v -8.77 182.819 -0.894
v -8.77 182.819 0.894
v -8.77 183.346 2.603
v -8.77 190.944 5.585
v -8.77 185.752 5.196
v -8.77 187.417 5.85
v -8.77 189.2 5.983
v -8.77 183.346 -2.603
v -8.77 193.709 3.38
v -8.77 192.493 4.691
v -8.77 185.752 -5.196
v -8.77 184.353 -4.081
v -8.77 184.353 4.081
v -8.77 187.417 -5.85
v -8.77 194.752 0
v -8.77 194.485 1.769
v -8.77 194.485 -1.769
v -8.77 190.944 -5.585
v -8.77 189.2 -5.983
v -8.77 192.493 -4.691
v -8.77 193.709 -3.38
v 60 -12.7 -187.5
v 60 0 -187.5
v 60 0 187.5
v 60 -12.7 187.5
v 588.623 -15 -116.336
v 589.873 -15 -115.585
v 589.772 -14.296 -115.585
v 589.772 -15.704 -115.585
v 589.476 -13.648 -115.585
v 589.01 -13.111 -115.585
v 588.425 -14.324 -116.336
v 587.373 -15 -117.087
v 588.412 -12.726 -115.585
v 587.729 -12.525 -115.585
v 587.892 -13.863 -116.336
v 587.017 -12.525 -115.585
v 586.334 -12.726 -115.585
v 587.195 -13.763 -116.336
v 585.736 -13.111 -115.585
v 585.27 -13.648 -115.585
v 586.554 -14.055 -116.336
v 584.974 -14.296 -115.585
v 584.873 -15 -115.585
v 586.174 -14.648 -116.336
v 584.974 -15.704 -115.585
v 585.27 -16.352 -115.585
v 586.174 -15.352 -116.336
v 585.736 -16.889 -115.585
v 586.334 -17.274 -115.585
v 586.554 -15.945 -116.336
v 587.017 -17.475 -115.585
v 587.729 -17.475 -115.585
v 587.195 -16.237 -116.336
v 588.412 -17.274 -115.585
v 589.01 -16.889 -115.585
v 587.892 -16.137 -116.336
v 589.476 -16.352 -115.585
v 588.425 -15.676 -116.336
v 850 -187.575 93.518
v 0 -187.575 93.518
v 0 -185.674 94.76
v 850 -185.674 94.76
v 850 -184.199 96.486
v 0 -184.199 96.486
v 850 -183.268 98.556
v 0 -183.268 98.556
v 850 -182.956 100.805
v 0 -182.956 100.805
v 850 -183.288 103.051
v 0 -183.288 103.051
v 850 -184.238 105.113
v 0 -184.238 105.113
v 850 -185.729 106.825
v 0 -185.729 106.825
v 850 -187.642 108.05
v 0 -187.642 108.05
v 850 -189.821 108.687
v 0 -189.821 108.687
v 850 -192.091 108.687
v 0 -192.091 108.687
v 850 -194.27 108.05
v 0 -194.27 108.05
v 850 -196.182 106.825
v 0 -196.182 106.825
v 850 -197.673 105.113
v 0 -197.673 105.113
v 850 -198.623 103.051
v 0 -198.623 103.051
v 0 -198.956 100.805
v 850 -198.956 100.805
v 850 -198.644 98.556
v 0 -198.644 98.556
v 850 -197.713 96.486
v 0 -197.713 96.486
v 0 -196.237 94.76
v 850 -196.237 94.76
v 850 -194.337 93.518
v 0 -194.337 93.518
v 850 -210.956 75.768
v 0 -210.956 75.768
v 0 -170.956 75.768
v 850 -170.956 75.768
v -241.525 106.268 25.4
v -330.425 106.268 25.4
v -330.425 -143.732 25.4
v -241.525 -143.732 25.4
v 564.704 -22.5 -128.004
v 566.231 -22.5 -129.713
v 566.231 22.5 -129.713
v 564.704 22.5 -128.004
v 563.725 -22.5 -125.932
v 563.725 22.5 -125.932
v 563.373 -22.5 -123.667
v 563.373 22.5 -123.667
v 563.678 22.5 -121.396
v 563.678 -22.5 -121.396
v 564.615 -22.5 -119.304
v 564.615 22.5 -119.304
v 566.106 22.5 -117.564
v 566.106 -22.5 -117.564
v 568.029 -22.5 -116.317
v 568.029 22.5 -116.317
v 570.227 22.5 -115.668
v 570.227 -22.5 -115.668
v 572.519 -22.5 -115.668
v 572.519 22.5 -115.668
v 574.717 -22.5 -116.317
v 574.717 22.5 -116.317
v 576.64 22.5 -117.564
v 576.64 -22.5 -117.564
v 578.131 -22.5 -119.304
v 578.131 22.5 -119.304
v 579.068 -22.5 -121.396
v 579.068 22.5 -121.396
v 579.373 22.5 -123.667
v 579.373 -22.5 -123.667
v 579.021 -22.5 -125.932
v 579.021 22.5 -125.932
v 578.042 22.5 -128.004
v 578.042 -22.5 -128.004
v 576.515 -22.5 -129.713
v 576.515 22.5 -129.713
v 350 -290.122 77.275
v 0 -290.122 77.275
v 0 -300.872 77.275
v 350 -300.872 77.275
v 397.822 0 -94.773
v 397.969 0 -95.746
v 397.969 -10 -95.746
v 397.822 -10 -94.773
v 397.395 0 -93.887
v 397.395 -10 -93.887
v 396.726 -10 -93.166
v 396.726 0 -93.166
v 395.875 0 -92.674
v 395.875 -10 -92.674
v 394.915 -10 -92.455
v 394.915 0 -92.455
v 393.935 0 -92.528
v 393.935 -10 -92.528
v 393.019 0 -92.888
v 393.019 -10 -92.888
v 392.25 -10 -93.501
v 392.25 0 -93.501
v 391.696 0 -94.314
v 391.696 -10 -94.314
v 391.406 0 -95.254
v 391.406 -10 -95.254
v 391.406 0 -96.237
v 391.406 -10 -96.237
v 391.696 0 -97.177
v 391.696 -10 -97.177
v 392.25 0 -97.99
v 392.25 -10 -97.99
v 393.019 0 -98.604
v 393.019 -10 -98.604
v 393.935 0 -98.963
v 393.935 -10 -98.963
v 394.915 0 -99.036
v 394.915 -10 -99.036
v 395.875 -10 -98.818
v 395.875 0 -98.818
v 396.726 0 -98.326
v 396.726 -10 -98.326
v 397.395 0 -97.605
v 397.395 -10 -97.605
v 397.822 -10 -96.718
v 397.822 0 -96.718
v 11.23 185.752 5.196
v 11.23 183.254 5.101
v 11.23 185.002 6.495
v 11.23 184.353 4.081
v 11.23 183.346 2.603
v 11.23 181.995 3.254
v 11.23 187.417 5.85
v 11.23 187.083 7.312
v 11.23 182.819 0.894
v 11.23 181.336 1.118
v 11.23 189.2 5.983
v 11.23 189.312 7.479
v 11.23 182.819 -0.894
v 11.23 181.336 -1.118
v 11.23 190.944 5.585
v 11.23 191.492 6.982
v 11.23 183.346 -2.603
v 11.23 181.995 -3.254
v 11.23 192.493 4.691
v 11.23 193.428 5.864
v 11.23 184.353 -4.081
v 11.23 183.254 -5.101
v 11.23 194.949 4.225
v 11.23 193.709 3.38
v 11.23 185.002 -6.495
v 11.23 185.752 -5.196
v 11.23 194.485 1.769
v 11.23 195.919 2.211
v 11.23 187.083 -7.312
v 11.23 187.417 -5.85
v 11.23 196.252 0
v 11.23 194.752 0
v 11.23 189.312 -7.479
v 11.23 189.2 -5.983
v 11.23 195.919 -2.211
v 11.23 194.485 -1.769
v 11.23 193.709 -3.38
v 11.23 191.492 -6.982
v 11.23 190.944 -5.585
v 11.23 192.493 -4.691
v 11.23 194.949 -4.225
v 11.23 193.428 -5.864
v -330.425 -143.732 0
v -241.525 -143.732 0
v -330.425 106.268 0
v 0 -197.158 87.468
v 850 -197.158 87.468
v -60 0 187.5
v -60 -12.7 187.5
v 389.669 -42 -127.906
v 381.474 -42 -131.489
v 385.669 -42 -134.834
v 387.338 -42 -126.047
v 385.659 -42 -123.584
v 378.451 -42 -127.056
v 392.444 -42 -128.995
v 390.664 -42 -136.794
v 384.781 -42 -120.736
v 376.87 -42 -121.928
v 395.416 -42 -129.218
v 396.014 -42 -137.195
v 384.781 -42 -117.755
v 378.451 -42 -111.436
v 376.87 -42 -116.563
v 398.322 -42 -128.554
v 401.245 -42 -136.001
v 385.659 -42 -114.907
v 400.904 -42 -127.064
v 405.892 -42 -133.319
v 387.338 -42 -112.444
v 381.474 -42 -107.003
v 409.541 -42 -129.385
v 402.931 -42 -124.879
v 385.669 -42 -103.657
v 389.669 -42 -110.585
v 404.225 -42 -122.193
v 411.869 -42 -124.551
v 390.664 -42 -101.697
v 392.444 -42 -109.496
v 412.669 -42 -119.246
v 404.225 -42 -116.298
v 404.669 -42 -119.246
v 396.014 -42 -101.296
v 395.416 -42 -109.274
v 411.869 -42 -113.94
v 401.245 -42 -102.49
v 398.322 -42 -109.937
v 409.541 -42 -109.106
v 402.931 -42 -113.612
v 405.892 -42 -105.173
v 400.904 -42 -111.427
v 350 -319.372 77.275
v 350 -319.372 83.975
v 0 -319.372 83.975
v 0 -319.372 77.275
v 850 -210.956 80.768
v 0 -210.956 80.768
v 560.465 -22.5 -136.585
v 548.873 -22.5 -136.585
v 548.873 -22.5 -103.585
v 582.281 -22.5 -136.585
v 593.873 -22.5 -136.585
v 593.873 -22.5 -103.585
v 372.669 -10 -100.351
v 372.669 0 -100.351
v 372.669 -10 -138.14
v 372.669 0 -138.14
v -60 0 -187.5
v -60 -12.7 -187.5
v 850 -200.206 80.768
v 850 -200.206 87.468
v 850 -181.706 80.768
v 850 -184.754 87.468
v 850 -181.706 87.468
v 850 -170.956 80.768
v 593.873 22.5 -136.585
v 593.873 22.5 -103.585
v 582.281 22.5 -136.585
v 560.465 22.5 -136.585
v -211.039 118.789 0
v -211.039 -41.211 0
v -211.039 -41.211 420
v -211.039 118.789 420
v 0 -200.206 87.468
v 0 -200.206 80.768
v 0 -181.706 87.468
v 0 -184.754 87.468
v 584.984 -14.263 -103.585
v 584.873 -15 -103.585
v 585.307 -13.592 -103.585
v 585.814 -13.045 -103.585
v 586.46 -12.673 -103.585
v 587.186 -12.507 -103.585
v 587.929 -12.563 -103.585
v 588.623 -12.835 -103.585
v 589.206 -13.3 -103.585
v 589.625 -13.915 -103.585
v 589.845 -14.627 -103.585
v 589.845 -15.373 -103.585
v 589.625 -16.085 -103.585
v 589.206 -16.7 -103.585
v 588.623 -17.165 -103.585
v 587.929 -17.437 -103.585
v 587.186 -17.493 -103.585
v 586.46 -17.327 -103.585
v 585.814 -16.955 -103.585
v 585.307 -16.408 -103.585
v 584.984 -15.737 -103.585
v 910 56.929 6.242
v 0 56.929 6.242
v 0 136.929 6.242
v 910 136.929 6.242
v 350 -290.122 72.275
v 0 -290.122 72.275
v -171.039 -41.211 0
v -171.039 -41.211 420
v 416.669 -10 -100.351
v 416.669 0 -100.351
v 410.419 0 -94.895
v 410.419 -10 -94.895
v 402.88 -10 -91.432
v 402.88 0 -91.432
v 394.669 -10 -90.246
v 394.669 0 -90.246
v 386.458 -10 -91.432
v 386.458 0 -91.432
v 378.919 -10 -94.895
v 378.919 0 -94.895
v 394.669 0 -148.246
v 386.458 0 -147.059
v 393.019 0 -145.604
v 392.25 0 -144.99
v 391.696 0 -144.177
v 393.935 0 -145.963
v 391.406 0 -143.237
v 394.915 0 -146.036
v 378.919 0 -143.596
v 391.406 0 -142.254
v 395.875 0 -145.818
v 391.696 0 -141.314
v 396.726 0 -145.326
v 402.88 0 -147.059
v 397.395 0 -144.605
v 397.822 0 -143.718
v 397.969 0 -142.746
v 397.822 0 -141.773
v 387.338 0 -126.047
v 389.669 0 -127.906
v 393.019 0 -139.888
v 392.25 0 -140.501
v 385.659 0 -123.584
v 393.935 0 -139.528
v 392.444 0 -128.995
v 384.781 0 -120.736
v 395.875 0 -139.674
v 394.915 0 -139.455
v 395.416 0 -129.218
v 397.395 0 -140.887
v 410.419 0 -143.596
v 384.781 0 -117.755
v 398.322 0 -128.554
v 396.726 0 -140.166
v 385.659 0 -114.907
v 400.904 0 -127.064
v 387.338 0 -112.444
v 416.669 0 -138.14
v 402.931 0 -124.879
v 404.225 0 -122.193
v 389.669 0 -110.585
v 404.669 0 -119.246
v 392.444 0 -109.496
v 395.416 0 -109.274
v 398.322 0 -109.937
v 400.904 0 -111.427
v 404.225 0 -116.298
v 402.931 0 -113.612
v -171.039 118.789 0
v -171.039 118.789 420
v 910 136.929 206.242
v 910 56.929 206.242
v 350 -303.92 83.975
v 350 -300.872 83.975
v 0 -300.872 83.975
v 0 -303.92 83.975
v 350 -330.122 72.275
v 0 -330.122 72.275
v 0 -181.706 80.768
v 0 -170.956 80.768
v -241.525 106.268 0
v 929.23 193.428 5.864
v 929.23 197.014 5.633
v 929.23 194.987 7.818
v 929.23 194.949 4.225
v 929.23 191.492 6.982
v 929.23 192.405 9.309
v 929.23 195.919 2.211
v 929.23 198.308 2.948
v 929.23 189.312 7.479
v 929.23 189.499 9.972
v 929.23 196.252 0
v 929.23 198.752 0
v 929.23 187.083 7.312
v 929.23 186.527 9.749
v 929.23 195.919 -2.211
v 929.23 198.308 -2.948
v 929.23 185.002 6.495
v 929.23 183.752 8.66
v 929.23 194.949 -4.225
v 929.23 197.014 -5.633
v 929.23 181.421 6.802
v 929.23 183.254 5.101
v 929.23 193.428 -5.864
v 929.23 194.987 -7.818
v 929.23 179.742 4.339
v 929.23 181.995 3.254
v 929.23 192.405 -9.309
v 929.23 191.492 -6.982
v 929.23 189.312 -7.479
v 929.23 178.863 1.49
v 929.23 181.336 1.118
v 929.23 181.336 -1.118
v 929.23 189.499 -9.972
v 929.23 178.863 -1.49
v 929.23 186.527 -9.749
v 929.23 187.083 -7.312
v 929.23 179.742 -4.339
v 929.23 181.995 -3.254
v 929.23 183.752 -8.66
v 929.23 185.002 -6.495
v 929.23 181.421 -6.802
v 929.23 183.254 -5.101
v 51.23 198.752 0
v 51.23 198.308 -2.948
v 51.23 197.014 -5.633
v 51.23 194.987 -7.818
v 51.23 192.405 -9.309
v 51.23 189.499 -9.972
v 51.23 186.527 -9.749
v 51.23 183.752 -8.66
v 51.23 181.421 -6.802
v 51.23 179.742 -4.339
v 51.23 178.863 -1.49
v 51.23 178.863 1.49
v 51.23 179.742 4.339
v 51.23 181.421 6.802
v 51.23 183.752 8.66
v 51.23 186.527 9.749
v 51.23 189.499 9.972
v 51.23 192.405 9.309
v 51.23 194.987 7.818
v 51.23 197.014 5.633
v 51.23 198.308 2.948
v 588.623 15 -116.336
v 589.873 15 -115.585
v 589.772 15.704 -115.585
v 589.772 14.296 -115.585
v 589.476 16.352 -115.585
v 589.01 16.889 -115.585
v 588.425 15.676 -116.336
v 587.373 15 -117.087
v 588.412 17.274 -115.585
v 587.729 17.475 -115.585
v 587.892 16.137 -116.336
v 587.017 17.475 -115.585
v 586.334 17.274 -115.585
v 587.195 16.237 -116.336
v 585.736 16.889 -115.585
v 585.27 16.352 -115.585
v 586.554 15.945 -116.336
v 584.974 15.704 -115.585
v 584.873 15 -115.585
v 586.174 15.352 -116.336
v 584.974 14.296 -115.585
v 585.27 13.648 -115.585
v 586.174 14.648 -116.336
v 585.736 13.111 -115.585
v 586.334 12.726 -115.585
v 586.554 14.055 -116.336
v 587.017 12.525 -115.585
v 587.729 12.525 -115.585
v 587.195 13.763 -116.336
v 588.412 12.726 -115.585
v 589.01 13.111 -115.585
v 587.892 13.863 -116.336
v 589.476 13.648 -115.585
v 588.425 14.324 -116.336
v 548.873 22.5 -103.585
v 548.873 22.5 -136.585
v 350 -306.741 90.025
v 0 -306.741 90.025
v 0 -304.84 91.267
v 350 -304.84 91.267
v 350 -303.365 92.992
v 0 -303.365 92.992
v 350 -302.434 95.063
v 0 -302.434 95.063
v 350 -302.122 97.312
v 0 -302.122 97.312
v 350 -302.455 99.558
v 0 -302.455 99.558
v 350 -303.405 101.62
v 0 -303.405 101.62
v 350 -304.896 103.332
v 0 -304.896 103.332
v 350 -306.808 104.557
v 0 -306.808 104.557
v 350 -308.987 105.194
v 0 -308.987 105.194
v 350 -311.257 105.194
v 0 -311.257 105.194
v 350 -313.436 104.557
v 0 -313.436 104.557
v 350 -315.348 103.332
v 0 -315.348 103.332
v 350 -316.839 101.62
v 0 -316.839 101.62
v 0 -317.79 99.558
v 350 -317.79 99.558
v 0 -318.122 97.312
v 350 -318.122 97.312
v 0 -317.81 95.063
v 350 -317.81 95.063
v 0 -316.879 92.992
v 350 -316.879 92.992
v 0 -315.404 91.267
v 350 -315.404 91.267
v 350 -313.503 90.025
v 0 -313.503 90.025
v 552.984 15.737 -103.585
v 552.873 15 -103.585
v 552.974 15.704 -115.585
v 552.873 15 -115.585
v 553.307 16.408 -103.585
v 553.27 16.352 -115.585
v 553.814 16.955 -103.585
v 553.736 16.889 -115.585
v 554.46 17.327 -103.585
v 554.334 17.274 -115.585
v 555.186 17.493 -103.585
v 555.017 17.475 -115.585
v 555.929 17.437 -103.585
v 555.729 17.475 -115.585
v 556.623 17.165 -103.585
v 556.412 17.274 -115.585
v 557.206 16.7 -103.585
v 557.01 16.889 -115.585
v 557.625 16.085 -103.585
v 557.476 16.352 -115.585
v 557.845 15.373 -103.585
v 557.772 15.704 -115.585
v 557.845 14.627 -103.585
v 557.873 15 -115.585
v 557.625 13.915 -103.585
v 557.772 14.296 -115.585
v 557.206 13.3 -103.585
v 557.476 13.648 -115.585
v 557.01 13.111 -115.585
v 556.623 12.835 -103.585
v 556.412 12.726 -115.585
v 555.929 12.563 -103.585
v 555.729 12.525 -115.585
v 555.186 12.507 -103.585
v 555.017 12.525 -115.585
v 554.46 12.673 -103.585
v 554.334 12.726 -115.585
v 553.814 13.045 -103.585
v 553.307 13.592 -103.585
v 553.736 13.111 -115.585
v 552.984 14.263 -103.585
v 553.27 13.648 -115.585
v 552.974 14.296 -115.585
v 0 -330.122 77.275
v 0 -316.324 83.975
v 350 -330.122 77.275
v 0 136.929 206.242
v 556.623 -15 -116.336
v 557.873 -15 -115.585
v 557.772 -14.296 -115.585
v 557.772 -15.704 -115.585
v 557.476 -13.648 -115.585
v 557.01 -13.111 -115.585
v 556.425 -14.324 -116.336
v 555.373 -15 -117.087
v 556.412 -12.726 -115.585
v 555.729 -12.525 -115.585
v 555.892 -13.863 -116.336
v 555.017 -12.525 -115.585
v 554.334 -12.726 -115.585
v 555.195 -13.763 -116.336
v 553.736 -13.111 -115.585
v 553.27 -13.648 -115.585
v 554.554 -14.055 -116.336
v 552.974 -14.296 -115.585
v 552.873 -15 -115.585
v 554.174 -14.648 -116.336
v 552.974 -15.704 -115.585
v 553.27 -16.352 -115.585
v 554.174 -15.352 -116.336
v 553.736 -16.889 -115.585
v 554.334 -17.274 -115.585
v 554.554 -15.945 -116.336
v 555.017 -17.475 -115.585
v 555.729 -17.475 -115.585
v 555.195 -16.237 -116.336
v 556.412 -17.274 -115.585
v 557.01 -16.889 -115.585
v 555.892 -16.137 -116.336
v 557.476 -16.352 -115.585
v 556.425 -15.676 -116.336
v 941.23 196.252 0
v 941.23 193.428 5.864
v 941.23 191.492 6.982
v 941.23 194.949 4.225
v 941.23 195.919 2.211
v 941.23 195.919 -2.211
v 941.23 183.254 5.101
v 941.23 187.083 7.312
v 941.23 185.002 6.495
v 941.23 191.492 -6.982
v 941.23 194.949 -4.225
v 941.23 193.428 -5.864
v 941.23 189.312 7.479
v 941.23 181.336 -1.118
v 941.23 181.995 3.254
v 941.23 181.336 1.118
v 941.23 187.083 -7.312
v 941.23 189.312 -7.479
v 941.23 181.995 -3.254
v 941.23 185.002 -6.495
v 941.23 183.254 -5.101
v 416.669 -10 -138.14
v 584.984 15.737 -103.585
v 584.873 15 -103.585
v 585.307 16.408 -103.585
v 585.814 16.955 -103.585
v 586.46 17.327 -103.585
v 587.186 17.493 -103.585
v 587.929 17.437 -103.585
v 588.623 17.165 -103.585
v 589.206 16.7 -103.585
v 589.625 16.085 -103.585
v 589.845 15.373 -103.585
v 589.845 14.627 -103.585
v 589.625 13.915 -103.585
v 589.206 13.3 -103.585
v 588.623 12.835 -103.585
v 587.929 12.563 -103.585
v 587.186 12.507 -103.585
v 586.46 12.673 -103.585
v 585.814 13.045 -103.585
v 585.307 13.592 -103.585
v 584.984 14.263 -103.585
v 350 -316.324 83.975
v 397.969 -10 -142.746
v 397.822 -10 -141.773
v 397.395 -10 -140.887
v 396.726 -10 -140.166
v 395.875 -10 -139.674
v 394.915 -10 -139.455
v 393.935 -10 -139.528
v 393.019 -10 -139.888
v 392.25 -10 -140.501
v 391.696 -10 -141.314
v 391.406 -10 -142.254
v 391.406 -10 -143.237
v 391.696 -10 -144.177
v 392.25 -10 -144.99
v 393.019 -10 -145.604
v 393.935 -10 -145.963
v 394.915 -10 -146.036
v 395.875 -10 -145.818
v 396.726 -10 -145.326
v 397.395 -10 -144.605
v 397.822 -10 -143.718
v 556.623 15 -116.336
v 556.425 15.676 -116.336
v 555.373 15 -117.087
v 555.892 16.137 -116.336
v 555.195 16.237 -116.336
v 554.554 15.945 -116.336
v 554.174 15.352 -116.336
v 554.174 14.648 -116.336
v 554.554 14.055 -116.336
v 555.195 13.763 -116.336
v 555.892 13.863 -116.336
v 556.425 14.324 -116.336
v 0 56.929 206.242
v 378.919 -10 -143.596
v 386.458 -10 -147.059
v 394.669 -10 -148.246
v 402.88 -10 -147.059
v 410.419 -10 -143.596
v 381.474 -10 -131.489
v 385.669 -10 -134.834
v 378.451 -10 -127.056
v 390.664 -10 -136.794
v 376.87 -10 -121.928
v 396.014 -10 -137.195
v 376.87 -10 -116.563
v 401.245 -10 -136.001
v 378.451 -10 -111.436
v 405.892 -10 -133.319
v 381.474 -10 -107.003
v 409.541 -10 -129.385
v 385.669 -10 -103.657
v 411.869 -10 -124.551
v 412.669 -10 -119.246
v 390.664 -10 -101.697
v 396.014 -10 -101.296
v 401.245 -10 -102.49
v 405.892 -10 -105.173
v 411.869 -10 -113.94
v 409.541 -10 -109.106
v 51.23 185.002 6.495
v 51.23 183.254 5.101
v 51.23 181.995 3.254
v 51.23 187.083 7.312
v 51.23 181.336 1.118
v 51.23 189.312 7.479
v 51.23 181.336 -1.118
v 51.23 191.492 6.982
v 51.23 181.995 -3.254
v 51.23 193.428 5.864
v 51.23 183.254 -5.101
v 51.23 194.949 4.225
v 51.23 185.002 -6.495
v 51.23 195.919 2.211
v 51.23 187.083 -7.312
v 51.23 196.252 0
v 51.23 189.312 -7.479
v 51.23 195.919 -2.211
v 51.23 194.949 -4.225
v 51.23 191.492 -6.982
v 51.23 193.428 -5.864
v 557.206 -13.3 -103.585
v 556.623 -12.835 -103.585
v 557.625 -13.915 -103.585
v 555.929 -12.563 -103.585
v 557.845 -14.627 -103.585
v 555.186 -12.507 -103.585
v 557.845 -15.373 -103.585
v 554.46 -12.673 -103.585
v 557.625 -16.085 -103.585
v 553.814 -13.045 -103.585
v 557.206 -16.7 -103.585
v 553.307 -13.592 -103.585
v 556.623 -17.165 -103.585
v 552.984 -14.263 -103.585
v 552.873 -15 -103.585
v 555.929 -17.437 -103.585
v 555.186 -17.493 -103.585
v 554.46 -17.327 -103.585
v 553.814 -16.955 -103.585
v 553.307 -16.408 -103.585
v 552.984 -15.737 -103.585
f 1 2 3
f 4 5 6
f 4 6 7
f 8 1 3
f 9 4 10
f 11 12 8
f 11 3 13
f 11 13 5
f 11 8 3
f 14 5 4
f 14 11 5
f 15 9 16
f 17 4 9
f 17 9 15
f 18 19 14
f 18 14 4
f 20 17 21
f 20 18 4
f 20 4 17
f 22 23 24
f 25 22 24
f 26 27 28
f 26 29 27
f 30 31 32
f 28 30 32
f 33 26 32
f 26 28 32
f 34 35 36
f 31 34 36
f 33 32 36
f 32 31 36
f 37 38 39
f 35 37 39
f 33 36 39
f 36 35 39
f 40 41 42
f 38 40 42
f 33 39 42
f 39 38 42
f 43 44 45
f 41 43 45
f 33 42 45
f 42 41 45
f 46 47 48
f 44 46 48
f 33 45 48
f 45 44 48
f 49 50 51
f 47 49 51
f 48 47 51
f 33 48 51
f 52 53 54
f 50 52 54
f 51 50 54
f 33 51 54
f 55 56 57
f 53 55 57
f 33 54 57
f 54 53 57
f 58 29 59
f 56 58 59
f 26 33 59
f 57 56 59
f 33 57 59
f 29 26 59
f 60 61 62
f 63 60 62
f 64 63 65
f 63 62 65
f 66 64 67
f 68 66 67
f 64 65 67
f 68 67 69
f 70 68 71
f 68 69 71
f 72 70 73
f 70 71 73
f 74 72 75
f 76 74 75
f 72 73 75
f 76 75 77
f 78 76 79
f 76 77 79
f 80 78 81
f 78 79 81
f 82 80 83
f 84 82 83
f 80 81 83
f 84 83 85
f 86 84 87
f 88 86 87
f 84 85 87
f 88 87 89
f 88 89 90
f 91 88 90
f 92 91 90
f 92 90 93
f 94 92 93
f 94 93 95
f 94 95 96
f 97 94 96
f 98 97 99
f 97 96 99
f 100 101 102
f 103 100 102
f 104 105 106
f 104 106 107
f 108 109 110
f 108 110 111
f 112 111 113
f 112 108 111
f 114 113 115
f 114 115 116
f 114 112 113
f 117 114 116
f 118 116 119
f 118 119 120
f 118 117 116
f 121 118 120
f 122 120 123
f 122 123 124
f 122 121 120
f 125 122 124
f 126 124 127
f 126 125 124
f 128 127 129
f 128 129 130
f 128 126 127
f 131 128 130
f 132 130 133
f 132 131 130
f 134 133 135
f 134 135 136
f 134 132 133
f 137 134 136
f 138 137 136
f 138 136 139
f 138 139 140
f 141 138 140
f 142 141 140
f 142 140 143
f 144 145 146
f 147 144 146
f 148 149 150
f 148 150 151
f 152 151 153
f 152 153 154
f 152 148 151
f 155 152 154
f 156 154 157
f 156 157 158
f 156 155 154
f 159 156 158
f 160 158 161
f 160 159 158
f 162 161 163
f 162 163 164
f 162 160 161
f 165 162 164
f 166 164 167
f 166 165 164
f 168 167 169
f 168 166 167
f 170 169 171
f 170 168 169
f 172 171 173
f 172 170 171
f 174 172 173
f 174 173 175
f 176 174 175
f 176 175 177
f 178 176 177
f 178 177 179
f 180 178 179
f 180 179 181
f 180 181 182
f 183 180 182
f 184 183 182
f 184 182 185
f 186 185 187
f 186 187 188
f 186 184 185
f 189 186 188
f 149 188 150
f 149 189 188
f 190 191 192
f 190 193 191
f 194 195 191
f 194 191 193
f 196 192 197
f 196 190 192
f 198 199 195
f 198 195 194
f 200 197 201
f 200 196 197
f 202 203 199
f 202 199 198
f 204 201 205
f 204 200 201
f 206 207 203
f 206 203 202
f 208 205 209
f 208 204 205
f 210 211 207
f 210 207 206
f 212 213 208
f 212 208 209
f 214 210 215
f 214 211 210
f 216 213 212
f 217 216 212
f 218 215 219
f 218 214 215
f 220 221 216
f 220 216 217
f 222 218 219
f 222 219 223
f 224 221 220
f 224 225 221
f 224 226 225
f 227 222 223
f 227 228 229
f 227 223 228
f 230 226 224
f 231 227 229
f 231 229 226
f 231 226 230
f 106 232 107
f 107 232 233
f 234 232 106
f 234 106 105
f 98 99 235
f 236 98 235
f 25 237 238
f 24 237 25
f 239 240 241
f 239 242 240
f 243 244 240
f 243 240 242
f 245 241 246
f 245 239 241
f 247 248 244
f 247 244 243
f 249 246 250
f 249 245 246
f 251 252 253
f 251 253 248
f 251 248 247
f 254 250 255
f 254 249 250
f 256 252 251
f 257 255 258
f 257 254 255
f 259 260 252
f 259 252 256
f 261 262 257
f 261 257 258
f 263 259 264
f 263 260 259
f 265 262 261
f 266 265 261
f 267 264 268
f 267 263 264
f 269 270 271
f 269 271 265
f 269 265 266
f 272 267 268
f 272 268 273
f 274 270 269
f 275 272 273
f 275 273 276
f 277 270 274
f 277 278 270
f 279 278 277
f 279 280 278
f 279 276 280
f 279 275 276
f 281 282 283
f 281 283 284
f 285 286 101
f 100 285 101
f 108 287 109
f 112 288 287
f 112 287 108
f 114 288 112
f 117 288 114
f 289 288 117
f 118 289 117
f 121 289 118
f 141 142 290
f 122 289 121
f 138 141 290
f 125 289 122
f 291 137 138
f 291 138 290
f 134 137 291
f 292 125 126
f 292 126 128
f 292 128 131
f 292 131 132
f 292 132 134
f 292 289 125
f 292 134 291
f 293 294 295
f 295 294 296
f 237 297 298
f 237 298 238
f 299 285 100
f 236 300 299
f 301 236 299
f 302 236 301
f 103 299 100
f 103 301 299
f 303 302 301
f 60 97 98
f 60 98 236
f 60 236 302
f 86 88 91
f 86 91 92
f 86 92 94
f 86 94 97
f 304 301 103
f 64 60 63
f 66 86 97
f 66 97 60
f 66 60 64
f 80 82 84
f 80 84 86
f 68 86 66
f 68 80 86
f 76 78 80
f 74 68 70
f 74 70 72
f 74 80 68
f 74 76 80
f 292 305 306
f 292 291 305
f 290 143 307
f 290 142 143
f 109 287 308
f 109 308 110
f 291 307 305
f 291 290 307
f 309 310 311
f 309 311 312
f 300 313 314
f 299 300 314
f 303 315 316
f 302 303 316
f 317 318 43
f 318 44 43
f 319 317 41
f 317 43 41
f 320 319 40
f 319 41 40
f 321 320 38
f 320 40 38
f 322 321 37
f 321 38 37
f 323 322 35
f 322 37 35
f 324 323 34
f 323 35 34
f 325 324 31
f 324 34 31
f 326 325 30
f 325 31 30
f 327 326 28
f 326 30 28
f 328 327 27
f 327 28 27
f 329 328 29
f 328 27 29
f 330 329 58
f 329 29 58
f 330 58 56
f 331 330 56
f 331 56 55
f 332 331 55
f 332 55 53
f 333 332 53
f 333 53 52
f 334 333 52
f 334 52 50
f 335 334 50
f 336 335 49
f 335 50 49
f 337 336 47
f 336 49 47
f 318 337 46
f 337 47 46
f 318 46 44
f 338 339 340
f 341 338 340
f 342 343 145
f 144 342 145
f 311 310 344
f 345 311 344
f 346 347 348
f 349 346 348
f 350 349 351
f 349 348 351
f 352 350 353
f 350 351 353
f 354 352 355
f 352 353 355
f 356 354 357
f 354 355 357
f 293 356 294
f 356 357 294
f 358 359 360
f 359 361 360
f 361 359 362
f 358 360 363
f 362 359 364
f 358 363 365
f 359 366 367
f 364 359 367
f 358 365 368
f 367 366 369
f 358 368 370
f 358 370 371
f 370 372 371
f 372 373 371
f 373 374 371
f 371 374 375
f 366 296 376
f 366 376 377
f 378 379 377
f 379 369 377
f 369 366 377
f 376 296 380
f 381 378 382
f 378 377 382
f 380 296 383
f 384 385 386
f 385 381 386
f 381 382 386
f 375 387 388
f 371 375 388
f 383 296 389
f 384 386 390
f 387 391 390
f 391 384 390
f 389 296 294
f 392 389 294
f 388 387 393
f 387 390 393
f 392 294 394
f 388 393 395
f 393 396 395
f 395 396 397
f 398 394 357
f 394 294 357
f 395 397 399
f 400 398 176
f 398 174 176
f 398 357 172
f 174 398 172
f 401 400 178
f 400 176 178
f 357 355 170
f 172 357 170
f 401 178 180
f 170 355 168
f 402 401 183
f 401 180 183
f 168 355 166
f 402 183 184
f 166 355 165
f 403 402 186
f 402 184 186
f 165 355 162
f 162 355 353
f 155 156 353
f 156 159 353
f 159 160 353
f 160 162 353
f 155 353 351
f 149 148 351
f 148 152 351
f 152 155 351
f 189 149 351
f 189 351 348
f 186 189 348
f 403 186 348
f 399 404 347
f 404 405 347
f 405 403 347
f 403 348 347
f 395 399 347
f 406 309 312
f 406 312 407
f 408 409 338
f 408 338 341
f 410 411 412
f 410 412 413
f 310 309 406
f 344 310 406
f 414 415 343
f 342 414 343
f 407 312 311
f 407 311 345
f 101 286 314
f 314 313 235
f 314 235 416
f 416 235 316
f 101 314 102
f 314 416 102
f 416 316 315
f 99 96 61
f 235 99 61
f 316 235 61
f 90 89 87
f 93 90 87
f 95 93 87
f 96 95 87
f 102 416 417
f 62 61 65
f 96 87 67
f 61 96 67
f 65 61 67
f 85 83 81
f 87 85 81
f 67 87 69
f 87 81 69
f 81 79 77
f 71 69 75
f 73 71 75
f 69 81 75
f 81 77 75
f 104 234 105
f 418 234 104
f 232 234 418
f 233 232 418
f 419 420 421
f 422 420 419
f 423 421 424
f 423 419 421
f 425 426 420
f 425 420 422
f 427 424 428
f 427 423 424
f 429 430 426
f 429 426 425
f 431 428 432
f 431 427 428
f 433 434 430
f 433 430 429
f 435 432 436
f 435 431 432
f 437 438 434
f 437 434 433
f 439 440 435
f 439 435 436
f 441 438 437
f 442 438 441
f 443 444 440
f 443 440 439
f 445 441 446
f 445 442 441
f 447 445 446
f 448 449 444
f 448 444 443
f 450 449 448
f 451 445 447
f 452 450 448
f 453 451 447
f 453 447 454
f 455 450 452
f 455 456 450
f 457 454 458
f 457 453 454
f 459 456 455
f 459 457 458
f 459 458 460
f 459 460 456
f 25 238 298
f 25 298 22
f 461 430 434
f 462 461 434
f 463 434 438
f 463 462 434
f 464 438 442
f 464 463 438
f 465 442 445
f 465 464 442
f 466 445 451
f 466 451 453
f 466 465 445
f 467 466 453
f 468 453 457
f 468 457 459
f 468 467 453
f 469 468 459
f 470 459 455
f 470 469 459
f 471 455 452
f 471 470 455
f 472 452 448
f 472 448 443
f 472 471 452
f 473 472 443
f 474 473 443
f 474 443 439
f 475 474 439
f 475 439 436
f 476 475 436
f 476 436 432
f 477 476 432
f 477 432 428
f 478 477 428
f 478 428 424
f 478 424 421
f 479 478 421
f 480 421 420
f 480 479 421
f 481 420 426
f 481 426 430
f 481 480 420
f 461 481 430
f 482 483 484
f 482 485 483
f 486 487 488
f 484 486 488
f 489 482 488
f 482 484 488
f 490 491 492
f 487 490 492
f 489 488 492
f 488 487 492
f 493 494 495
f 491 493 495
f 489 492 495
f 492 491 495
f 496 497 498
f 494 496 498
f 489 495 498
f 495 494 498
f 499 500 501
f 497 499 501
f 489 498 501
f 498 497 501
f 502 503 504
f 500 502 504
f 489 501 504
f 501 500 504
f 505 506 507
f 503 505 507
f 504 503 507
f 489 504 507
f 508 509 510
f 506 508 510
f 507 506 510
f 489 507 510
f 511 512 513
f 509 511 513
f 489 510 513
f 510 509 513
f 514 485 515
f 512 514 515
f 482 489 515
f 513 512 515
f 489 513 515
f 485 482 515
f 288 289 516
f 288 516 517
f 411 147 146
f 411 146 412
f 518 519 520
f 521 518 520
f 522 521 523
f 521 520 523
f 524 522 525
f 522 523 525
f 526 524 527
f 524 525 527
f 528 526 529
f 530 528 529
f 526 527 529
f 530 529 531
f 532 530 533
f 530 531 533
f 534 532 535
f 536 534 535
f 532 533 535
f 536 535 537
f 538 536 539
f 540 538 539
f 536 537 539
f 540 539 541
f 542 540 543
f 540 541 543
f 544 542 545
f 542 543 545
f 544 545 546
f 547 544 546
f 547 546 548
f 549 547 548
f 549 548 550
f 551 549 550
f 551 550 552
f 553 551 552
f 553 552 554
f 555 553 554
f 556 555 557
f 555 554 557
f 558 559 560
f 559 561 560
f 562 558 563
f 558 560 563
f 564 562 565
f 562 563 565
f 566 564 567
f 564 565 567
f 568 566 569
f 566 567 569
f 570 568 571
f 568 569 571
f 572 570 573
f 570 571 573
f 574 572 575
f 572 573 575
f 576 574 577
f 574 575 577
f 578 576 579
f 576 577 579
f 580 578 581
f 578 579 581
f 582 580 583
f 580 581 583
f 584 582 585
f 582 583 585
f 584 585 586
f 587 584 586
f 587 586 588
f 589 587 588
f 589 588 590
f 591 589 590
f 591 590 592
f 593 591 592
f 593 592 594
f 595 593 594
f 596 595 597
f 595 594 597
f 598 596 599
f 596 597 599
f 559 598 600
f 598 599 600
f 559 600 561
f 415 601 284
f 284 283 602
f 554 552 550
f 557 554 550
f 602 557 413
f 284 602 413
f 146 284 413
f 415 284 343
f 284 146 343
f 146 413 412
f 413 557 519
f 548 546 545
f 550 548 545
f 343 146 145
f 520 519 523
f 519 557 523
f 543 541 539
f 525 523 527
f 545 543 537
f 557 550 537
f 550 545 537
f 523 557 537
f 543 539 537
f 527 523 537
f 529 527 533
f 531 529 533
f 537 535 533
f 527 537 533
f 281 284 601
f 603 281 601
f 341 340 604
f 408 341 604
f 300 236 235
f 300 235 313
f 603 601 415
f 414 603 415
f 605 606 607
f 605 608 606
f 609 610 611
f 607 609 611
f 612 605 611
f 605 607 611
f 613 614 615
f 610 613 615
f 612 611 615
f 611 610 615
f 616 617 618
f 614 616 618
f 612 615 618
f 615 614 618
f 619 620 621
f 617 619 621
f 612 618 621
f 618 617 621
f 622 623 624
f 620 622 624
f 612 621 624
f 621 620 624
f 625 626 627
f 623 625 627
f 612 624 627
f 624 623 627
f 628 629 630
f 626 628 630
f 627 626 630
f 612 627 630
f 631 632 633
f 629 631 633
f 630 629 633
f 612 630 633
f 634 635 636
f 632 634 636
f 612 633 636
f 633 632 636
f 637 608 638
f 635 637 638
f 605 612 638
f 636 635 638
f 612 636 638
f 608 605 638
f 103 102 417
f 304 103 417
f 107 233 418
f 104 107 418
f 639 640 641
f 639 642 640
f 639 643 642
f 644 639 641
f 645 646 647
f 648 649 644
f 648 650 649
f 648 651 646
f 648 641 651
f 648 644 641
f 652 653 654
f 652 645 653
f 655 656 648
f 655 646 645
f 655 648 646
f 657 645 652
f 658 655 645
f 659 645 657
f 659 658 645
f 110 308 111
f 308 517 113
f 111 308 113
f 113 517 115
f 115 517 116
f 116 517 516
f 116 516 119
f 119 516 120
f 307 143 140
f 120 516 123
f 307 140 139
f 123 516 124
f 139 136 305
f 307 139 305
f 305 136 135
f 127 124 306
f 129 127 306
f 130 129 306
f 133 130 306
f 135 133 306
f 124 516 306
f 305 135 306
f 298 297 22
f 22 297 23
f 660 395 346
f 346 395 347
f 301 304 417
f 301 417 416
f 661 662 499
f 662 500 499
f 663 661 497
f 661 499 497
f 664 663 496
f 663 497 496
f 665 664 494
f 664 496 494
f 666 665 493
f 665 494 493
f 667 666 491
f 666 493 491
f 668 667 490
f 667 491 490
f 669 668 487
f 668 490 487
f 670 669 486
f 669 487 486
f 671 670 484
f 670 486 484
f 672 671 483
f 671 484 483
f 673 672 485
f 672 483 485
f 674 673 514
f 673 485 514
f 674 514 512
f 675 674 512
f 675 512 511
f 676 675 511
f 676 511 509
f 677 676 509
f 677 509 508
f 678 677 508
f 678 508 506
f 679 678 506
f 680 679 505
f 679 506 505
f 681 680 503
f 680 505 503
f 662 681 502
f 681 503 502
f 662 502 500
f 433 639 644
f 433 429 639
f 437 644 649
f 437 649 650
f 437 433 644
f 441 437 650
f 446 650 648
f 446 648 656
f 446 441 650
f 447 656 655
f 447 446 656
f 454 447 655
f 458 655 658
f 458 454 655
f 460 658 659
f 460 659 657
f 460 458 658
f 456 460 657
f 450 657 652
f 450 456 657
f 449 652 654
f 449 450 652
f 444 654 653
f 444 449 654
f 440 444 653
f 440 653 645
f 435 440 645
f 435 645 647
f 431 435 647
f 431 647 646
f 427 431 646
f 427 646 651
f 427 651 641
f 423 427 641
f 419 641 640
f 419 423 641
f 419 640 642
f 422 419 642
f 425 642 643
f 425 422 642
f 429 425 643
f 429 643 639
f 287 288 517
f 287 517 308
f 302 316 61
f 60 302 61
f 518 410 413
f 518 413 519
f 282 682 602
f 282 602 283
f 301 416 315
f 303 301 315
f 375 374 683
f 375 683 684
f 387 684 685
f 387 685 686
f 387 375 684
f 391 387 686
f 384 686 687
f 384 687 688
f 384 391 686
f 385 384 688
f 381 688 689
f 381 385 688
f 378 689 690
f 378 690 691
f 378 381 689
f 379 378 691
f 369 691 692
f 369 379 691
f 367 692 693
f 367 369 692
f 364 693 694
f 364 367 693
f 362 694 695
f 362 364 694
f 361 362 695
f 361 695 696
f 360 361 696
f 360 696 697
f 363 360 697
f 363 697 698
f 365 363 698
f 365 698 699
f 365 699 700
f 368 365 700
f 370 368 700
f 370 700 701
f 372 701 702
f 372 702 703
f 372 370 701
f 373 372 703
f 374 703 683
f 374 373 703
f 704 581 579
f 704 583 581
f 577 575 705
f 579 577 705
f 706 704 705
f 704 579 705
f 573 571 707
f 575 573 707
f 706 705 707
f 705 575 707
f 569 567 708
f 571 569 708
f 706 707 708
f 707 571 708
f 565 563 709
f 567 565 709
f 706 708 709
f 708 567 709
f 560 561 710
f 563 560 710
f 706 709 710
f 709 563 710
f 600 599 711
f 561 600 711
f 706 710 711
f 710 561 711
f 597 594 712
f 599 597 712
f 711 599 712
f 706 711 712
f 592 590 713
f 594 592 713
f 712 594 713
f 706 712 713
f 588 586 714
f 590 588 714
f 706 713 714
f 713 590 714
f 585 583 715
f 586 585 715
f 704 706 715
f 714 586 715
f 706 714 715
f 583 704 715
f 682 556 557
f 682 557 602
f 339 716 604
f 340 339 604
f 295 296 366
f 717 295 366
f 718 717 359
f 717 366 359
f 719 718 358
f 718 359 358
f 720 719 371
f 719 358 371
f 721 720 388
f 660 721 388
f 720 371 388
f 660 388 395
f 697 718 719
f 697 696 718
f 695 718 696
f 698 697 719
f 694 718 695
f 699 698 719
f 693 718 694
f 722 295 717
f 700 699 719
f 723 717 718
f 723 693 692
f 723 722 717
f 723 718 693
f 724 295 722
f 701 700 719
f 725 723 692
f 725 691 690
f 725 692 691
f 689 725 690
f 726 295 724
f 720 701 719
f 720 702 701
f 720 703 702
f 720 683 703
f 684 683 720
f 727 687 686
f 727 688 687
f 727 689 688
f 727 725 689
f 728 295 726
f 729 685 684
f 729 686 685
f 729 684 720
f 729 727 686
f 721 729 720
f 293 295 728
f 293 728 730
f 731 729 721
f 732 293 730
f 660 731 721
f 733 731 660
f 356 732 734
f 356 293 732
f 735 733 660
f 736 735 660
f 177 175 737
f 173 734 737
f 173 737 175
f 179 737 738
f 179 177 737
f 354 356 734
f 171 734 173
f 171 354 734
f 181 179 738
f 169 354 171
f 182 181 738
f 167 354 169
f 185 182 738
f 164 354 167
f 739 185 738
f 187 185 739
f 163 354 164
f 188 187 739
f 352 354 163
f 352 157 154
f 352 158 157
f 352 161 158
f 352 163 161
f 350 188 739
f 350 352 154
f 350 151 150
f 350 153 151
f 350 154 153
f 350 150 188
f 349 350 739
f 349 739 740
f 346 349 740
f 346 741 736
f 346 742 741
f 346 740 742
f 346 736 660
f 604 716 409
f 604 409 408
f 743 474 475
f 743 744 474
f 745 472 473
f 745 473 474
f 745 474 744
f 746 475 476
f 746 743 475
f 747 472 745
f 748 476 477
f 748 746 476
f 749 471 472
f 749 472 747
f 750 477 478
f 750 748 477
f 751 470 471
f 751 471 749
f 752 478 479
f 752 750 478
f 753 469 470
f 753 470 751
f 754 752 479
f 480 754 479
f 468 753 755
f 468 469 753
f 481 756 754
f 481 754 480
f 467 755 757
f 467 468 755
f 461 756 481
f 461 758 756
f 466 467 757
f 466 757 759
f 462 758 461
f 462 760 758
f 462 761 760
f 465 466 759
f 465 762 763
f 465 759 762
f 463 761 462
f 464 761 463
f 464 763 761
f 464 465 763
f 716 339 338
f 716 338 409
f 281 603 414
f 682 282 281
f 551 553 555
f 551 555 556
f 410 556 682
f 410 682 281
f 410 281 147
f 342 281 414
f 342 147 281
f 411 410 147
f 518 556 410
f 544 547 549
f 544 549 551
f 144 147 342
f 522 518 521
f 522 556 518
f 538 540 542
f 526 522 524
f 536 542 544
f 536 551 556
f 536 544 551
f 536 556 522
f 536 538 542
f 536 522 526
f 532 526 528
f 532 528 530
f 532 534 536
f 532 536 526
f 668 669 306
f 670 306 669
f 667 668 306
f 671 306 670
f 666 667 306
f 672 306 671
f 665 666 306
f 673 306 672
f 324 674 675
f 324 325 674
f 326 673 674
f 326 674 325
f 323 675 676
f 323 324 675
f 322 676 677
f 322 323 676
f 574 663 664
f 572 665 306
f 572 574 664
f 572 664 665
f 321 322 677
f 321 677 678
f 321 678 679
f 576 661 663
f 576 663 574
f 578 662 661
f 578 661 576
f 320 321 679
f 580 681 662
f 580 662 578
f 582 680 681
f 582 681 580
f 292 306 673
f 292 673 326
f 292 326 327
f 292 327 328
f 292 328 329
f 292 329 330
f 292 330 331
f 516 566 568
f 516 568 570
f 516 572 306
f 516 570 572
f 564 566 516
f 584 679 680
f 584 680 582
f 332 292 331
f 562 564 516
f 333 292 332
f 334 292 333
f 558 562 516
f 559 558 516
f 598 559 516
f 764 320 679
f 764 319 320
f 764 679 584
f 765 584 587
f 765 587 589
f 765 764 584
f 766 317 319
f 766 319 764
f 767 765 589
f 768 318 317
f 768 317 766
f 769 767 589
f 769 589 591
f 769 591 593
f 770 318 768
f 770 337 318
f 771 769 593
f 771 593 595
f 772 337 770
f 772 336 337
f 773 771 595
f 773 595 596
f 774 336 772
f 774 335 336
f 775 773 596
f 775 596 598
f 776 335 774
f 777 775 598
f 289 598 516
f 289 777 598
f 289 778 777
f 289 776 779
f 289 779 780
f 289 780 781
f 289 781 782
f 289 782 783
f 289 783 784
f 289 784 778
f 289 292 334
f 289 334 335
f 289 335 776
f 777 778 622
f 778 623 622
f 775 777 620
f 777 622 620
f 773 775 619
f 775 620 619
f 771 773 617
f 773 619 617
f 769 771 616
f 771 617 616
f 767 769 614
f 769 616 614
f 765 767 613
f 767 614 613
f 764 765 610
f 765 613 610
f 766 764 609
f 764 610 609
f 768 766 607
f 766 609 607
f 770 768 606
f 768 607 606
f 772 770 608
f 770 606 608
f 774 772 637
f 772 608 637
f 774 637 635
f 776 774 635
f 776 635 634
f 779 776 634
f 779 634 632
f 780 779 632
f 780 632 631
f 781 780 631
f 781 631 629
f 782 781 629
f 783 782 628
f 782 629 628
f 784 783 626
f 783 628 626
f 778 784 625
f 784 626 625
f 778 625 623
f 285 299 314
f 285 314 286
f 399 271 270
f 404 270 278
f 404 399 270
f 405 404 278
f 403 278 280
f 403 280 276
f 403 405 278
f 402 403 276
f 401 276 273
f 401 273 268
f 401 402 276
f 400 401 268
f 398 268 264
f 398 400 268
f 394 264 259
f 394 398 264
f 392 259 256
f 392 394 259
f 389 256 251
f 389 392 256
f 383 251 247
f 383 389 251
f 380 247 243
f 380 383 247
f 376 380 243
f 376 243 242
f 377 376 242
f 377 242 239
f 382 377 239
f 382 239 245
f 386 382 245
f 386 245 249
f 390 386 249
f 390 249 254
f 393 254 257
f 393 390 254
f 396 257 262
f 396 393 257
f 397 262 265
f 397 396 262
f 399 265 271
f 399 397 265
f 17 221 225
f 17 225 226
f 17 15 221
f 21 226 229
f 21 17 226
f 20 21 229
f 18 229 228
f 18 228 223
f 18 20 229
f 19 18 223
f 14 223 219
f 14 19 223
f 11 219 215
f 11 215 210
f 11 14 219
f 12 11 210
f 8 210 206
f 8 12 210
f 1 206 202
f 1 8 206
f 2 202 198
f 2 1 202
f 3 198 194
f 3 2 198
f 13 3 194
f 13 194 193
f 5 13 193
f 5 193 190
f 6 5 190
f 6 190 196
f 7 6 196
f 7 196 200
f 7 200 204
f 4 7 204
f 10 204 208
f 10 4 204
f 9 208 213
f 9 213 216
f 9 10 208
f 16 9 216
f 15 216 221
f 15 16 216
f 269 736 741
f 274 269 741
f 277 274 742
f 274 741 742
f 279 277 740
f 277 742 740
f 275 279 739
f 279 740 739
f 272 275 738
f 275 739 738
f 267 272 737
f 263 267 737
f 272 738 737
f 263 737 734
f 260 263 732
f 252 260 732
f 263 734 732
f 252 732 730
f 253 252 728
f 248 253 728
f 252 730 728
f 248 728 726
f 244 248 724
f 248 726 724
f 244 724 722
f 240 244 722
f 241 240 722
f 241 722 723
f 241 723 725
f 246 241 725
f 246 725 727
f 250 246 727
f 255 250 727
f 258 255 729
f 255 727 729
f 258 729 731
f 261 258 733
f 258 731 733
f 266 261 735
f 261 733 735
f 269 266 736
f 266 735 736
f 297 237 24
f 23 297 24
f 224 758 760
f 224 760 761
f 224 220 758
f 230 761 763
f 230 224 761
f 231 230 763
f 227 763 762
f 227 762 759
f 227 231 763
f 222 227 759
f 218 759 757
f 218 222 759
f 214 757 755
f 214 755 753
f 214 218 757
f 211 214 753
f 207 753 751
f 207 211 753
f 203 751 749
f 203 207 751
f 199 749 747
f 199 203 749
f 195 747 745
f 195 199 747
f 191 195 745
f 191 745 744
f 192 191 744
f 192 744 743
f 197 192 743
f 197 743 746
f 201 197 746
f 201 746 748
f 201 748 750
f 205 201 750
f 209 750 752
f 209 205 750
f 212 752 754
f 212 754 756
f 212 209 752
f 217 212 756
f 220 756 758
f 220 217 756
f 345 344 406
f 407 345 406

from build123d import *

# Parameters (mm, degrees)
F0_W      = 120
F0_H      = 375
F1_DEPTH  = 12.7
F2_W      = 80
F2_H      = 200
F3_DEPTH  = 910
F4_W      = 40
F4_H      = 160
F5_DEPTH  = 420
F6_W      = 88.9
F6_H      = 250
F7_DEPTH  = 25.4
F9_DEPTH  = 22.5
F11_D     = 5
F11_DEPTH = 12
F11_TIP   = 1.5021515476
F12_R     = 3.3
F12_R_2   = 10
F13_DEPTH = 10
F14_R     = 18
F14_R_2   = 10
F15_DEPTH = 32
F19_DEPTH = 850
F21_DEPTH = 350


with BuildPart() as f1:
    # F0 (on Front) → F1 (new body)
    with BuildSketch(Plane.XZ):
        Rectangle(F0_W, F0_H)
    extrude(amount=F1_DEPTH)


with BuildPart() as f3:
    # F2 (on Right) → F3 (new body)
    with BuildSketch(Plane.YZ):
        with Locations((96.9289559871, 106.2416992025)):
            Rectangle(F2_W, F2_H)
    extrude(amount=F3_DEPTH)


with BuildPart() as f5:
    # F4 (on Top) → F5 (new body)
    with BuildSketch(Plane.XY):
        with Locations((-191.0385191441, 38.7887568785)):
            Rectangle(F4_W, F4_H)
    extrude(amount=F5_DEPTH)


with BuildPart() as f7:
    # F6 (on Top) → F7 (new body)
    with BuildSketch(Plane.XY):
        with Locations((-285.9749857664, -18.732093201)):
            Rectangle(F6_W, F6_H)
    extrude(amount=F7_DEPTH)


with BuildPart() as f9:
    # F8 (on Front) → F9 (new body, symmetric)
    with BuildSketch(Plane.XZ):
        with BuildLine():
            Line((593.8730051517, -136.5850613447), (593.8730051517, -103.5850613447))
            Line((593.8730051517, -103.5850613447), (548.8730051517, -103.5850613447))
            Line((548.8730051517, -103.5850613447), (548.8730051517, -136.5850613447))
            Line((548.8730051517, -136.5850613447), (560.4647099464, -136.5850613447))
            Line((560.4647099464, -136.5850613447), (566.2307042743, -129.7134168896))
            ThreePointArc((566.2307042743, -129.7134168896), (571.3730051517, -115.5850613447), (576.5153060292, -129.7134168896))
            Line((576.5153060292, -129.7134168896), (582.2813003571, -136.5850613447))
            Line((582.2813003571, -136.5850613447), (593.8730051517, -136.5850613447))
        make_face()
    extrude(amount=F9_DEPTH, both=True)

    # F11
    with Locations(Plane.XY.offset(-103.5850613447)):
        with Locations((555.3730051517, 15), (587.3730051517, 15), (587.3730051517, -15), (555.3730051517, -15)):
            Hole(F11_D / 2, depth=F11_DEPTH)
            with Locations((0, 0, -(F11_DEPTH + F11_TIP / 2))):  # 118° drill point
                Cone(0, F11_D / 2, F11_TIP, mode=Mode.SUBTRACT)


with BuildPart() as f13:
    # F12 (on Front) → F13 (new body)
    with BuildSketch(Plane.XZ):
        with BuildLine():
            Line((416.6688771248, -138.14006966), (416.6688771248, -100.3511824047))
            ThreePointArc((416.6688771248, -100.3511824047), (394.6688771248, -90.2456260324), (372.6688771248, -100.3511824047))
            Line((372.6688771248, -100.3511824047), (372.6688771248, -138.14006966))
            ThreePointArc((372.6688771248, -138.14006966), (394.6688771248, -148.2456260324), (416.6688771248, -138.14006966))
        make_face()
        with Locations((394.6688771248, -142.7456260324)):
            Circle(F12_R, mode=Mode.SUBTRACT)
        with Locations((394.6688771248, -119.2456260324)):
            Circle(F12_R_2, mode=Mode.SUBTRACT)
        with Locations((394.6688771248, -95.7456260324)):
            Circle(F12_R, mode=Mode.SUBTRACT)
    extrude(amount=F13_DEPTH)

    # F14 (on face) → F15 (join)
    with BuildSketch(Plane.XZ.offset(10)):
        with Locations((394.6688771248, -119.2456260324)):
            Circle(F14_R)
        with Locations((394.6688771248, -119.2456260324)):
            Circle(F14_R_2, mode=Mode.SUBTRACT)
    extrude(amount=F15_DEPTH)


with BuildPart() as f17:
    # F16 (on Top) → F17 (revolve)
    with BuildSketch(Plane.XY):
        Polygon((-8.7700150907, 194.7517869473), (-8.7700150907, 188.7517869473), (941.2299849093, 188.7517869473), (941.2299849093, 196.2517869473), (929.2299849093, 196.2517869473), (929.2299849093, 198.7517869473), (51.2299849093, 198.7517869473), (51.2299849093, 196.2517869473), (11.2299849093, 196.2517869473), (11.2299849093, 194.7517869473), align=None)
    revolve(axis=Axis((-40.8084288169, 188.7517869473, 0), (-1, 0, 0)))


with BuildPart() as f19:
    # F18 (on Right) → F19 (new body)
    with BuildSketch(Plane.YZ):
        with BuildLine():
            Line((-210.9557174785, 80.7684522526), (-210.9557174785, 75.7684522526))
            Line((-210.9557174785, 75.7684522526), (-170.9557174785, 75.7684522526))
            Line((-170.9557174785, 75.7684522526), (-170.9557174785, 80.7684522526))
            Line((-170.9557174785, 80.7684522526), (-181.7057174785, 80.7684522526))
            Line((-181.7057174785, 80.7684522526), (-181.7057174785, 87.4684522526))
            Line((-181.7057174785, 87.4684522526), (-184.753825625, 87.4684522526))
            Line((-184.753825625, 87.4684522526), (-187.5747713846, 93.5179899563))
            ThreePointArc((-187.5747713846, 93.5179899563), (-190.9557174785, 108.7684522526), (-194.3366635724, 93.5179899563))
            Line((-194.3366635724, 93.5179899563), (-197.1576093319, 87.4684522526))
            Line((-197.1576093319, 87.4684522526), (-200.2057174785, 87.4684522526))
            Line((-200.2057174785, 87.4684522526), (-200.2057174785, 80.7684522526))
            Line((-200.2057174785, 80.7684522526), (-210.9557174785, 80.7684522526))
        make_face()
    extrude(amount=F19_DEPTH)


with BuildPart() as f21:
    # F20 (on Right) → F21 (new body)
    with BuildSketch(Plane.YZ):
        with BuildLine():
            Line((-330.122102499, 77.2753372088), (-330.122102499, 72.2753372088))
            Line((-330.122102499, 72.2753372088), (-290.122102499, 72.2753372088))
            Line((-290.122102499, 72.2753372088), (-290.122102499, 77.2753372088))
            Line((-290.122102499, 77.2753372088), (-300.872102499, 77.2753372088))
            Line((-300.872102499, 77.2753372088), (-300.872102499, 83.9753372088))
            Line((-300.872102499, 83.9753372088), (-303.9202106455, 83.9753372088))
            Line((-303.9202106455, 83.9753372088), (-306.7411564051, 90.0248749125))
            ThreePointArc((-306.7411564051, 90.0248749125), (-310.122102499, 105.2753372088), (-313.5030485929, 90.0248749125))
            Line((-313.5030485929, 90.0248749125), (-316.3239943525, 83.9753372088))
            Line((-316.3239943525, 83.9753372088), (-319.372102499, 83.9753372088))
            Line((-319.372102499, 83.9753372088), (-319.372102499, 77.2753372088))
            Line((-319.372102499, 77.2753372088), (-330.122102499, 77.2753372088))
        make_face()
    extrude(amount=F21_DEPTH)


solid = Compound([f1.part, f3.part, f5.part, f7.part, f9.part, f13.part, f17.part, f19.part, f21.part])
